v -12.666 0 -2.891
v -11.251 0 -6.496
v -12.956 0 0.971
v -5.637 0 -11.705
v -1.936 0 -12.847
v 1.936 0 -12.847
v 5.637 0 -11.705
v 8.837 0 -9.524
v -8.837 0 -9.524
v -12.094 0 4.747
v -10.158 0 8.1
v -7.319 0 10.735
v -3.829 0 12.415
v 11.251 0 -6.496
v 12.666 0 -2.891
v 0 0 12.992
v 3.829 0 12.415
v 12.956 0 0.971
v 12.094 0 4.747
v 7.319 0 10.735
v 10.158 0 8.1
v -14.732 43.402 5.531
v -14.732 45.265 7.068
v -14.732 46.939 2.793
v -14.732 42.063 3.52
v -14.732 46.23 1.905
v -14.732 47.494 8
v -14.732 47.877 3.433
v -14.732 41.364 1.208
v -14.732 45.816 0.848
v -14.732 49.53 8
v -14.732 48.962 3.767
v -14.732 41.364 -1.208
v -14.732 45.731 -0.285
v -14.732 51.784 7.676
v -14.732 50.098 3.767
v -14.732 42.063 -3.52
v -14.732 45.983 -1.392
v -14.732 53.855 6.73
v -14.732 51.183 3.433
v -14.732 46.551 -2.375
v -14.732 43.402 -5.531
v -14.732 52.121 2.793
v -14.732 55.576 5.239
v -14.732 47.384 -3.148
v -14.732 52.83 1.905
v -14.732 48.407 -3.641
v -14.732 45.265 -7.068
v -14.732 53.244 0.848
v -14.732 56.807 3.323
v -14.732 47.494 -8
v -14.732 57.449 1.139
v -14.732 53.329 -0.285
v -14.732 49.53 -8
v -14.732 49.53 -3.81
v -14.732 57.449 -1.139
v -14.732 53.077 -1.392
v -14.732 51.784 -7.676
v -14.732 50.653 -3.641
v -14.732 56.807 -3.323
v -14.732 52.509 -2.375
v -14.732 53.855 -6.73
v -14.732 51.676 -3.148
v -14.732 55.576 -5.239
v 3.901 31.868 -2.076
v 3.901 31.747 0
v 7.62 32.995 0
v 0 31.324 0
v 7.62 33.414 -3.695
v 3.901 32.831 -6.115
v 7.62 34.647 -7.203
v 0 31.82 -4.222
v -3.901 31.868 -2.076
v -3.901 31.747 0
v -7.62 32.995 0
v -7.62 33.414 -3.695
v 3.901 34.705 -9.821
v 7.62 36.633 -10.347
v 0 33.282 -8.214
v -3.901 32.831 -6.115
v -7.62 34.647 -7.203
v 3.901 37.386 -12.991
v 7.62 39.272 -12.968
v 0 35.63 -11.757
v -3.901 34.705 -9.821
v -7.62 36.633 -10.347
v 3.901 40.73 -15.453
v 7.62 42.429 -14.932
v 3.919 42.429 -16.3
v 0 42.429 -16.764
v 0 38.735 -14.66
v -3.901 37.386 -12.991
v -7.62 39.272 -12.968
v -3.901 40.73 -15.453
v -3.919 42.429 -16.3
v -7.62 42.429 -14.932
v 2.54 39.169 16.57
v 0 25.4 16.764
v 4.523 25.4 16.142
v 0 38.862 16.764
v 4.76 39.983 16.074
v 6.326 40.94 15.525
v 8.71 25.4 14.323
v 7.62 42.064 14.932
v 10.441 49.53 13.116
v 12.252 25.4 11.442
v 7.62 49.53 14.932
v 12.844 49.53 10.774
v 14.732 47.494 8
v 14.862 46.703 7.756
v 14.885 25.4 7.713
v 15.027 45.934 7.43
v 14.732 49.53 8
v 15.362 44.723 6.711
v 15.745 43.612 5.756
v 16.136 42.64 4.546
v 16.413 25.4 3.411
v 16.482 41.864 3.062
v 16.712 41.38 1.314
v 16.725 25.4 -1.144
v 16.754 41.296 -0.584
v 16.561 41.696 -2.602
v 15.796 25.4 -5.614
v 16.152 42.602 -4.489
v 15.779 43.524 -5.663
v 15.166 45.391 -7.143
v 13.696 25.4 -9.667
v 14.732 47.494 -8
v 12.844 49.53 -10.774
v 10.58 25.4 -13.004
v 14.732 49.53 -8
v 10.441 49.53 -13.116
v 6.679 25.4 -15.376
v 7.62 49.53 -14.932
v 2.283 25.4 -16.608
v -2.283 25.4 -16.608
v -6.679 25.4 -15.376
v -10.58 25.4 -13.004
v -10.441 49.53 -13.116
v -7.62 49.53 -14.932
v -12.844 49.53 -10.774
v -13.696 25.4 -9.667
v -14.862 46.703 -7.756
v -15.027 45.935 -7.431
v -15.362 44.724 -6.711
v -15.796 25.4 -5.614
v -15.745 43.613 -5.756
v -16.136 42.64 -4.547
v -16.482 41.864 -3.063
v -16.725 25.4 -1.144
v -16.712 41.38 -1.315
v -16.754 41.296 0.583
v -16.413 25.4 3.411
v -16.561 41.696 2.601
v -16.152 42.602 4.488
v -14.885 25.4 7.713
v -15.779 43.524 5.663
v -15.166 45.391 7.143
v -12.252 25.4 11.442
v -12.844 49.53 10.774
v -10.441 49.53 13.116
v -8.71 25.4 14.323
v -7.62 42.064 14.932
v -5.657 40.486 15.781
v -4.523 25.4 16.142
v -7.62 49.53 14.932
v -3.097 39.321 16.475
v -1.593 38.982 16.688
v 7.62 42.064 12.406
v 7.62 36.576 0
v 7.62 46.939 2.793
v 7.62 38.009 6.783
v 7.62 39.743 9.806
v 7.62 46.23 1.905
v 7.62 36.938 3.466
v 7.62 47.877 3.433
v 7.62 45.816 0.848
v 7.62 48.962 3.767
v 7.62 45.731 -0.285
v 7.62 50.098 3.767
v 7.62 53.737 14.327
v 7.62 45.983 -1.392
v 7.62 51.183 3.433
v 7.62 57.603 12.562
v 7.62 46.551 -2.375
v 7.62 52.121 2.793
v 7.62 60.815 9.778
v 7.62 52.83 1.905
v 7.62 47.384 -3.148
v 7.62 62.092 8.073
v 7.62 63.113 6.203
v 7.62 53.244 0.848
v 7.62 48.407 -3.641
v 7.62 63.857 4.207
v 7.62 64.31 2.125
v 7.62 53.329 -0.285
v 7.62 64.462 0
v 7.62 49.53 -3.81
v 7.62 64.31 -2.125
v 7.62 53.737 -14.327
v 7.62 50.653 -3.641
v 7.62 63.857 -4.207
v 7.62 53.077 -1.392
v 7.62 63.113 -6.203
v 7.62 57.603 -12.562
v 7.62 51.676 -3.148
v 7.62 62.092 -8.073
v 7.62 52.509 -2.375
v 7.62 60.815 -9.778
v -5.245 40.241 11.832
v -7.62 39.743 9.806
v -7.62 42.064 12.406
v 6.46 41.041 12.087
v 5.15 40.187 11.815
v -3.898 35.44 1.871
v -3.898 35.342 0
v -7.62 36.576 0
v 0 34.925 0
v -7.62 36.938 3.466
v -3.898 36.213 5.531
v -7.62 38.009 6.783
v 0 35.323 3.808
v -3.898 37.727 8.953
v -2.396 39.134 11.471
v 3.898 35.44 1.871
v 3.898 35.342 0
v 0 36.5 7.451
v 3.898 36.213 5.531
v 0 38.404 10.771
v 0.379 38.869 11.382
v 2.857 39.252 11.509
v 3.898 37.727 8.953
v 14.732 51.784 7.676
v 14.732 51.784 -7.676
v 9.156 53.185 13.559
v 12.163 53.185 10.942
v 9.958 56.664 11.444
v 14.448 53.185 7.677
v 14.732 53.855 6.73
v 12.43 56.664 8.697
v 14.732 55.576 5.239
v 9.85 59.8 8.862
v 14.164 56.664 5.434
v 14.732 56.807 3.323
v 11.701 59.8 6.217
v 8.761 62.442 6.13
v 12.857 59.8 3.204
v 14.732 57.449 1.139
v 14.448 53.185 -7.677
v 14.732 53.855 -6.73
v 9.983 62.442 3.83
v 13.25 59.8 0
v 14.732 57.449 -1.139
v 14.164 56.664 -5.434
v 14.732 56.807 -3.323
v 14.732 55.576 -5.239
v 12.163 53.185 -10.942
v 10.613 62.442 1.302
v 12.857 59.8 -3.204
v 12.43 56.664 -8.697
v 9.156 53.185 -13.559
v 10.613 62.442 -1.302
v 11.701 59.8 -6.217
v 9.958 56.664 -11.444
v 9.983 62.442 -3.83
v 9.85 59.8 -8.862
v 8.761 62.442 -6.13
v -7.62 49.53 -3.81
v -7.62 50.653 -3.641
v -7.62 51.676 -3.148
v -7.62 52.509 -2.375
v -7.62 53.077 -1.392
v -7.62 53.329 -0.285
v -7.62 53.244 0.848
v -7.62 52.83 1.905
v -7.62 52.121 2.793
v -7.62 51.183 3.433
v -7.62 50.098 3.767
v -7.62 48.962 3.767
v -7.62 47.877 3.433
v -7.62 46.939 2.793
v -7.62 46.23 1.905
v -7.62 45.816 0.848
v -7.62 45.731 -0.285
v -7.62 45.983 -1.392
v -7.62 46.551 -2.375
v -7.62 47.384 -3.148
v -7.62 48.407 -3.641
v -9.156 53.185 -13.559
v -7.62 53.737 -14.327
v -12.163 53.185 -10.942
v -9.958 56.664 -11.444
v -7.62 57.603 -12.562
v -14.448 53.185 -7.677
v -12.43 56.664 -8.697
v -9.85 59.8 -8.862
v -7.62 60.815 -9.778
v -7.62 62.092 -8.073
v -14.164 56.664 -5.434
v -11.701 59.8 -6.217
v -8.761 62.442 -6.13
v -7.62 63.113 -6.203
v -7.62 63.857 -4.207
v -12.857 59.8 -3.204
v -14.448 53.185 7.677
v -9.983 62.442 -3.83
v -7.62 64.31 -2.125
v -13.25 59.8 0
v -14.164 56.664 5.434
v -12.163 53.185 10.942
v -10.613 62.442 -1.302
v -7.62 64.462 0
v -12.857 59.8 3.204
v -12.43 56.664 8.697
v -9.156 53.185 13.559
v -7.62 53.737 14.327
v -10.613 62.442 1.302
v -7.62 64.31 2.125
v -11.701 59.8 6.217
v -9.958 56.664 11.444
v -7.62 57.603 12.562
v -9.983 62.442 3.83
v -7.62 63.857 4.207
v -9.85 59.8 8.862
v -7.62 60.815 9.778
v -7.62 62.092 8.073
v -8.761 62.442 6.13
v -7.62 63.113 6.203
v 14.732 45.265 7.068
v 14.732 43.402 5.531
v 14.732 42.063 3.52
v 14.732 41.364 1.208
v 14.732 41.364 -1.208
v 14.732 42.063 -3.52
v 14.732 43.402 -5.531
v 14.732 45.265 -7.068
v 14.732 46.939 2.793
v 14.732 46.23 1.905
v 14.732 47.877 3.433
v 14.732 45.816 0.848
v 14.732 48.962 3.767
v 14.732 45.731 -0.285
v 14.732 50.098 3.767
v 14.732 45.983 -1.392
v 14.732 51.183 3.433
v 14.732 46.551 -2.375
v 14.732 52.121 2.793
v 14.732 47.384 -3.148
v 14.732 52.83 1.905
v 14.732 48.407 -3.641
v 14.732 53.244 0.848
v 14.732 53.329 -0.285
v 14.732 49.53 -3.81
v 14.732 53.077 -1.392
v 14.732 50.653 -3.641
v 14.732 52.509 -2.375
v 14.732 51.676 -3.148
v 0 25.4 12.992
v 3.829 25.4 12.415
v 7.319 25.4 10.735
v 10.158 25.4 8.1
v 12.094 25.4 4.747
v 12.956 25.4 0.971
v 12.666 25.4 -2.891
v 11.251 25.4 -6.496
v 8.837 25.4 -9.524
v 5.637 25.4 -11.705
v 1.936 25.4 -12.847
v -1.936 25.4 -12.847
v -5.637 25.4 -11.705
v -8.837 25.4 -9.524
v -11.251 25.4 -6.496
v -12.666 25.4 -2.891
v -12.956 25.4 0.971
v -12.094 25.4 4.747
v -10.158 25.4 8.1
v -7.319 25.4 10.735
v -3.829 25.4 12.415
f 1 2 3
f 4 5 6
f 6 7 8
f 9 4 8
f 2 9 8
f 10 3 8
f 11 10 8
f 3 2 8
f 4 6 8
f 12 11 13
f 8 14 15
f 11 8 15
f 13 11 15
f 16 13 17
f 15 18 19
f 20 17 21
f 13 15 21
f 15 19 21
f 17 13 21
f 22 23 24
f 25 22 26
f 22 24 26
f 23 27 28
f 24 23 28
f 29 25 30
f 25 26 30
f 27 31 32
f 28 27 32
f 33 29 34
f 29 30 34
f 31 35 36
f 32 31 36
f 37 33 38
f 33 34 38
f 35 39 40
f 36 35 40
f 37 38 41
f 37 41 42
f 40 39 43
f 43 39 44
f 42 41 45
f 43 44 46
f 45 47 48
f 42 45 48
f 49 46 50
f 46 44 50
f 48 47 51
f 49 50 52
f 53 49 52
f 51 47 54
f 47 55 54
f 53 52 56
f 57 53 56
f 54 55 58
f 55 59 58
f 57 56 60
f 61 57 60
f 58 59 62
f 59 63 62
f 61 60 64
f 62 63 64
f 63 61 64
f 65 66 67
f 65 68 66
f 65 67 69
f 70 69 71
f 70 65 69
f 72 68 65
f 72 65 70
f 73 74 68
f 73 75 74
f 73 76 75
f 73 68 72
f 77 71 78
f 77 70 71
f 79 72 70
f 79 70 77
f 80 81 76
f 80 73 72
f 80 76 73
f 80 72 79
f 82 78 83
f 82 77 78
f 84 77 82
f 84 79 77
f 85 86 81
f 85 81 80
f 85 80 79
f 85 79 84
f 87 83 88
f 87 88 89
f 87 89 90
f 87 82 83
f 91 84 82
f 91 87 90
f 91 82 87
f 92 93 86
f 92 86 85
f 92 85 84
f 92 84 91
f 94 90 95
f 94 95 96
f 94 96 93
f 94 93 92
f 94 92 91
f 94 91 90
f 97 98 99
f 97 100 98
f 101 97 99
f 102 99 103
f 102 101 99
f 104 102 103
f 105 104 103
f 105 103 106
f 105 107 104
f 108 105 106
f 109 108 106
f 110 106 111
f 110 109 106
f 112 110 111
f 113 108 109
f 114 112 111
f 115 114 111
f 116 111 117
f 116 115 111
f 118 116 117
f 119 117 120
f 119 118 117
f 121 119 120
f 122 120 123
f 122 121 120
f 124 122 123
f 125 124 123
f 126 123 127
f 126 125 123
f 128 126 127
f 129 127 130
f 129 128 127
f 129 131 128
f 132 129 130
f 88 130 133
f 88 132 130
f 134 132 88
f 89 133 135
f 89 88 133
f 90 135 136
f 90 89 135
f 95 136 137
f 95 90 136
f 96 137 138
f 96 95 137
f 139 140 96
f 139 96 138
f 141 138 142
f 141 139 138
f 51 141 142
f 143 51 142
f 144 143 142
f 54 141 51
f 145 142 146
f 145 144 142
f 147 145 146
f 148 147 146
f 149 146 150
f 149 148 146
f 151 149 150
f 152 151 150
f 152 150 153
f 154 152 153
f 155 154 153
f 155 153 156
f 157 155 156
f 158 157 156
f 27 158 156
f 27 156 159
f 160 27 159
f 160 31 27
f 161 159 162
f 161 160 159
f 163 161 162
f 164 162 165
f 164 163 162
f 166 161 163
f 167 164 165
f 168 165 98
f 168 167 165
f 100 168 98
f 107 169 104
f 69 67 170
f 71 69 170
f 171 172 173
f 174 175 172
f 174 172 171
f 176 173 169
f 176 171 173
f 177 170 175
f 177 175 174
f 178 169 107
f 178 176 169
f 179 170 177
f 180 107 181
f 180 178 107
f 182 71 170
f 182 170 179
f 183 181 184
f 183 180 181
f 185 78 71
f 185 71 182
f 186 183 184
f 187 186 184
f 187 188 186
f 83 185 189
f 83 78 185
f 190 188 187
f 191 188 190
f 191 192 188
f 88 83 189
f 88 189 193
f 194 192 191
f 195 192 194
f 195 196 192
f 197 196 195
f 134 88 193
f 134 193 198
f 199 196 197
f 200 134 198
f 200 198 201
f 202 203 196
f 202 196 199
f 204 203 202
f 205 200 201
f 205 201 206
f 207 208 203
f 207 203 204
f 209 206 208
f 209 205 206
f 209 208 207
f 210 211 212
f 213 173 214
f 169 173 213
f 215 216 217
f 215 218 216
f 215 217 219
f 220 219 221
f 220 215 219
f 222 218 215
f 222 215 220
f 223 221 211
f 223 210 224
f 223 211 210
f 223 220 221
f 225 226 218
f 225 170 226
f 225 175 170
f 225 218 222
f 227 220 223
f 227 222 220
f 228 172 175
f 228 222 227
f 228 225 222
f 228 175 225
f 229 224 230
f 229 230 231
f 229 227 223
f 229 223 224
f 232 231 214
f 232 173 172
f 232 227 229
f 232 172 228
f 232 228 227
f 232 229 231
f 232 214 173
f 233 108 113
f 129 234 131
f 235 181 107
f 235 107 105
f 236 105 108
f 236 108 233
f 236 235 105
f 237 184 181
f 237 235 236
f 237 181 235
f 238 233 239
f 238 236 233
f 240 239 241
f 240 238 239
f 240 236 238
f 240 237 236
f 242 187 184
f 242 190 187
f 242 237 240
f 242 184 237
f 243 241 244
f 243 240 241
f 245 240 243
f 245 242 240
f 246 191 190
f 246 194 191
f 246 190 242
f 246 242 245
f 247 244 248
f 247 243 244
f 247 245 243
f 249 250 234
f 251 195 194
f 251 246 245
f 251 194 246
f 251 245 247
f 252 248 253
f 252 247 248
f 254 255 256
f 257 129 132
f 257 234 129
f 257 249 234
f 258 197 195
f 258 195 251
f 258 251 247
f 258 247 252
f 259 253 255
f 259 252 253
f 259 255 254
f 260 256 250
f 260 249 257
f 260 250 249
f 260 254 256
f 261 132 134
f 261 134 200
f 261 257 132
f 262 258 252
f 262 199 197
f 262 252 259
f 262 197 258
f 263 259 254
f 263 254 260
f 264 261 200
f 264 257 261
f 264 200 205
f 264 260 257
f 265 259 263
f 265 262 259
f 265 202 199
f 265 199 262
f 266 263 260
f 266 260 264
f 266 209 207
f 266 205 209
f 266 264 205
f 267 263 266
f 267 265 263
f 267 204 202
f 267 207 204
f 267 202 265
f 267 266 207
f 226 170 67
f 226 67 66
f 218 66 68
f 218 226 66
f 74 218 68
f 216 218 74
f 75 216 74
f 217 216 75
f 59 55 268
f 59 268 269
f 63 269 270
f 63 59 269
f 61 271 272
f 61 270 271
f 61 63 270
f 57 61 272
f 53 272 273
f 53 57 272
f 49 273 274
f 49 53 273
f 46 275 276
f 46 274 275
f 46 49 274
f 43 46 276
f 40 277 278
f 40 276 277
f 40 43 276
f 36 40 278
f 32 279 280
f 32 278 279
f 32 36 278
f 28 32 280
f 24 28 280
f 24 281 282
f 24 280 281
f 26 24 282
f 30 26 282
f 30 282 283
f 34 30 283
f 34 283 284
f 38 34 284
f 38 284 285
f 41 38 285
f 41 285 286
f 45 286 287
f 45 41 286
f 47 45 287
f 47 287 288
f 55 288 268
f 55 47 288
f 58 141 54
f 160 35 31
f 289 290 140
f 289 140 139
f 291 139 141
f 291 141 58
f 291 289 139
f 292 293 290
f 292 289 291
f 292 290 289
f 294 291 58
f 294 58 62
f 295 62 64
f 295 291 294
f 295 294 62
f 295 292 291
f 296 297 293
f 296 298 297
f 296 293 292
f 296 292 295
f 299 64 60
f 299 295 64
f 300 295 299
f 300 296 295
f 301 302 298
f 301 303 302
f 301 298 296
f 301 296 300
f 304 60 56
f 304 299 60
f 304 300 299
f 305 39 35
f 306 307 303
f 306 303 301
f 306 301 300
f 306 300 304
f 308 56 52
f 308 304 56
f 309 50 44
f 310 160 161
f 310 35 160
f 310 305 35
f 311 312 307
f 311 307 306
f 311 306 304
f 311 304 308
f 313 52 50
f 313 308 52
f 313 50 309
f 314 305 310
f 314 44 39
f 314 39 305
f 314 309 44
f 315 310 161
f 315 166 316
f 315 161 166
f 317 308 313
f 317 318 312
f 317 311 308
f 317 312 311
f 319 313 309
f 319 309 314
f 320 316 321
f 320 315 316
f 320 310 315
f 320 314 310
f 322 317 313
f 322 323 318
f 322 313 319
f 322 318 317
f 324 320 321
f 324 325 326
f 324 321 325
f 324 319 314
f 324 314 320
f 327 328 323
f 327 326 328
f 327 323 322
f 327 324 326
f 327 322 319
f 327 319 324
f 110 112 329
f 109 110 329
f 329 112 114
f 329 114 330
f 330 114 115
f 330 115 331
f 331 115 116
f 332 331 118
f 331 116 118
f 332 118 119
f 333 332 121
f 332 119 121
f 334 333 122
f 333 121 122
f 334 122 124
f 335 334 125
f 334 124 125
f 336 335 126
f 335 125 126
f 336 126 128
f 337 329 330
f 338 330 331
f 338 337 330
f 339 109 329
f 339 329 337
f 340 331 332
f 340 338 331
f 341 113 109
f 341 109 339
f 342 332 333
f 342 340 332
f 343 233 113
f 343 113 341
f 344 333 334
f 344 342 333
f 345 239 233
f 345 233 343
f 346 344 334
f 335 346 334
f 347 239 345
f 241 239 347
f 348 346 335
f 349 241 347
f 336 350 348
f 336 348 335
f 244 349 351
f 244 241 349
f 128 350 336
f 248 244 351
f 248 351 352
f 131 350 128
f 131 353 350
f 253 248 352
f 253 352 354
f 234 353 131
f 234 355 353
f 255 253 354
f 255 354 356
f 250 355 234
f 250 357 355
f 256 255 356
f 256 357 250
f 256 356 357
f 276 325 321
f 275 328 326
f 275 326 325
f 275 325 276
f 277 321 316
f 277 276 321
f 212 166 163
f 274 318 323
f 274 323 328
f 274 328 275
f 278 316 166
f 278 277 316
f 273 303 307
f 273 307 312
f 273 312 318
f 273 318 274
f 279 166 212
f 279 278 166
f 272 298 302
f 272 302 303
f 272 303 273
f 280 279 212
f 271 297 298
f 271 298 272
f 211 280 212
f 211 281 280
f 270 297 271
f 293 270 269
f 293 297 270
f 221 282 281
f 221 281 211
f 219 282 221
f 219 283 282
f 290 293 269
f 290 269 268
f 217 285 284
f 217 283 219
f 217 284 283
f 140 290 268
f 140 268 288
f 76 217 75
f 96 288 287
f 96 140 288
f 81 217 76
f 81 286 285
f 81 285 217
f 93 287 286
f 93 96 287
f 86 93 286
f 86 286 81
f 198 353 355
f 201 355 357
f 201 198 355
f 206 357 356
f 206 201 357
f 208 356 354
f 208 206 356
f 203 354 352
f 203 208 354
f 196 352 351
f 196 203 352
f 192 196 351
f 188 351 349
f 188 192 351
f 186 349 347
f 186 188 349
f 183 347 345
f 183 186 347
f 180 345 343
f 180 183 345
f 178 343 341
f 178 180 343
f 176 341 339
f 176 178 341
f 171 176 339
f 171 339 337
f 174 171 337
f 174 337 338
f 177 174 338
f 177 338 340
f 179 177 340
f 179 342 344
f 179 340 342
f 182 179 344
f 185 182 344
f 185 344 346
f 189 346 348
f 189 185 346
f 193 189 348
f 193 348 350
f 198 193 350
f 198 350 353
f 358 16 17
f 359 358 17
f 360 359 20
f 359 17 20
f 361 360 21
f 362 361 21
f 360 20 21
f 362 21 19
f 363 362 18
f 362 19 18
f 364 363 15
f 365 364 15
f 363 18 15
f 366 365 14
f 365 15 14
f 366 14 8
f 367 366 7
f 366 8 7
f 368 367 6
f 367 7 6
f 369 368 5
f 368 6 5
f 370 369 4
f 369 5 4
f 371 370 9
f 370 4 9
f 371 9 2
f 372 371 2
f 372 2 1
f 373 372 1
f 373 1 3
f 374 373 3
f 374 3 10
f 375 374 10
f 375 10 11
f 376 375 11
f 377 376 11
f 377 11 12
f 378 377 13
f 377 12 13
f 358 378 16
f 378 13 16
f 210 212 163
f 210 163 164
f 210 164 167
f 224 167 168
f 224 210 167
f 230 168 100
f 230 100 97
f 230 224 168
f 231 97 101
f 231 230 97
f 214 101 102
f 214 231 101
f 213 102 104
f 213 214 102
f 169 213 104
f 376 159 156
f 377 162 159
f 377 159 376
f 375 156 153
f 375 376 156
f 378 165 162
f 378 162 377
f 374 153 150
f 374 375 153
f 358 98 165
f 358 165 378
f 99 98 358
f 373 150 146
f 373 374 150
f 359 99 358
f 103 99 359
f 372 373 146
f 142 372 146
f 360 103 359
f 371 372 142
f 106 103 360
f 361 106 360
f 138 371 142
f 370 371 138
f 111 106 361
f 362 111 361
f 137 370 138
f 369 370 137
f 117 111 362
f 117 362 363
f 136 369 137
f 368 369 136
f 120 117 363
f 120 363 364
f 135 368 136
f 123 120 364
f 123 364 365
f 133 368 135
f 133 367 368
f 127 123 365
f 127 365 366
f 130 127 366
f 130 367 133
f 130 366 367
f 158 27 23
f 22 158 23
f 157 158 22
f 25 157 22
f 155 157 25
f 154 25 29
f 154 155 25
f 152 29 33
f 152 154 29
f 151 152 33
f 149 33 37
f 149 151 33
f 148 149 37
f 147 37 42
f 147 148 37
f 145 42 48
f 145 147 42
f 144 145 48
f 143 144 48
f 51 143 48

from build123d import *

# Parameters (mm, degrees)
SKETCH1_R               = 12.9921
BOSS_EXTRUDE1_DEPTH     = 25.4
CUT_EXTRUDE1_DEPTH      = 71.405666164
CUT_EXTRUDE1_DEPTH_BACK = 71.405666164
SKETCH3_R               = 3.81
CUT_REVOLVE1_ANGLE      = 270
CUT_REVOLVE2_ANGLE      = 270
SKETCH6_R               = 8.255
CUT_EXTRUDE2_DEPTH      = 2.032
CUT_EXTRUDE3_DEPTH      = 24.638


with BuildPart() as part:
    # Sketch1 → Boss-Extrude1 (new body)
    with BuildSketch(Plane(origin=(0, 0, 0), x_dir=(1, 0, 0), z_dir=(0, 1, 0))):
        with Locations(Location((0, 0, 0), (0, 0, 270))):
            Circle(SKETCH1_R)
    extrude(amount=BOSS_EXTRUDE1_DEPTH)

    # Sketch2 → Revolve1 (revolve)
    with BuildSketch(Plane(origin=(0, 0, 0), x_dir=(0, 0, -1), z_dir=(1, 0, 0))):
        with BuildLine():
            Line((-16.764, 25.4), (-16.764, 49.53))
            ThreePointArc((-16.764, 49.53), (-11.85393808, 61.38393808), (0, 66.294))
            Line((0, 66.294), (0, 25.4))
            Line((0, 25.4), (-16.764, 25.4))
        make_face()
    revolve(axis=Axis((0, 25.4, 0), (0, 1, 0)))

    # Sketch3 → Cut-Extrude1 (cut, two sides: drawn at the far end of the back side and taken through both)
    with BuildSketch(Plane(origin=(0, 0, 0), x_dir=(0, 0, -1), z_dir=(1, 0, 0)).offset(-CUT_EXTRUDE1_DEPTH_BACK)):
        with Locations((0, 49.53)):
            Circle(SKETCH3_R)
    extrude(amount=CUT_EXTRUDE1_DEPTH + CUT_EXTRUDE1_DEPTH_BACK, mode=Mode.SUBTRACT)

    # Sketch4 → Cut-Revolve1 (revolve, cut)
    with BuildSketch(Plane.XY):
        with BuildLine():
            Line((-7.62, 32.995439638), (-7.62, 49.53))
            Line((-7.62, 49.53), (7.62, 49.53))
            Line((7.62, 49.53), (7.62, 32.995439638))
            ThreePointArc((7.62, 32.995439638), (0, 31.32406453), (-7.62, 32.995439638))
        make_face()
    revolve(axis=Axis((-7.62, 49.53, 0), (1, 0, 0)), revolution_arc=CUT_REVOLVE1_ANGLE, mode=Mode.SUBTRACT)

    # Sketch5 → Cut-Revolve2 (revolve, cut)
    with BuildSketch(Plane.XY):
        with BuildLine():
            Line((7.62, 53.34), (-7.62, 53.34))
            Line((-7.62, 53.34), (-7.62, 36.575518946))
            ThreePointArc((-7.62, 36.575518946), (0, 34.925), (7.62, 36.575518946))
            Line((7.62, 36.575518946), (7.62, 53.34))
        make_face()
    revolve(axis=Axis((7.62, 53.34, 0), (-1, 0, 0)), revolution_arc=CUT_REVOLVE2_ANGLE, mode=Mode.SUBTRACT)

    # Sketch6 → Cut-Extrude2 (cut)
    with BuildSketch(Plane(origin=(16.764, 0, 0), x_dir=(0, 0, -1), z_dir=(1, 0, 0))):
        with Locations((0, 49.53)):
            Circle(SKETCH6_R)
    cut_extrude2 = extrude(amount=-CUT_EXTRUDE2_DEPTH, mode=Mode.SUBTRACT)

    # Mirror1: Cut-Extrude2 across plane
    add(cut_extrude2.mirror(Plane(origin=(0, 0, 0), x_dir=(0, 0, 1), z_dir=(1, 0, 0))), mode=Mode.SUBTRACT)

    # Sketch7 → Cut-Extrude3 (cut)
    with BuildSketch(Plane.XY):
        with BuildLine():
            Line((-7.62, 49.53), (-7.62, 42.063955264))
            ThreePointArc((-7.62, 42.063955264), (0, 38.862), (7.62, 42.063955264))
            Line((7.62, 42.063955264), (7.62, 49.53))
            Line((7.62, 49.53), (-7.62, 49.53))
        make_face()
    extrude(amount=CUT_EXTRUDE3_DEPTH, mode=Mode.SUBTRACT)


solid = part.part
